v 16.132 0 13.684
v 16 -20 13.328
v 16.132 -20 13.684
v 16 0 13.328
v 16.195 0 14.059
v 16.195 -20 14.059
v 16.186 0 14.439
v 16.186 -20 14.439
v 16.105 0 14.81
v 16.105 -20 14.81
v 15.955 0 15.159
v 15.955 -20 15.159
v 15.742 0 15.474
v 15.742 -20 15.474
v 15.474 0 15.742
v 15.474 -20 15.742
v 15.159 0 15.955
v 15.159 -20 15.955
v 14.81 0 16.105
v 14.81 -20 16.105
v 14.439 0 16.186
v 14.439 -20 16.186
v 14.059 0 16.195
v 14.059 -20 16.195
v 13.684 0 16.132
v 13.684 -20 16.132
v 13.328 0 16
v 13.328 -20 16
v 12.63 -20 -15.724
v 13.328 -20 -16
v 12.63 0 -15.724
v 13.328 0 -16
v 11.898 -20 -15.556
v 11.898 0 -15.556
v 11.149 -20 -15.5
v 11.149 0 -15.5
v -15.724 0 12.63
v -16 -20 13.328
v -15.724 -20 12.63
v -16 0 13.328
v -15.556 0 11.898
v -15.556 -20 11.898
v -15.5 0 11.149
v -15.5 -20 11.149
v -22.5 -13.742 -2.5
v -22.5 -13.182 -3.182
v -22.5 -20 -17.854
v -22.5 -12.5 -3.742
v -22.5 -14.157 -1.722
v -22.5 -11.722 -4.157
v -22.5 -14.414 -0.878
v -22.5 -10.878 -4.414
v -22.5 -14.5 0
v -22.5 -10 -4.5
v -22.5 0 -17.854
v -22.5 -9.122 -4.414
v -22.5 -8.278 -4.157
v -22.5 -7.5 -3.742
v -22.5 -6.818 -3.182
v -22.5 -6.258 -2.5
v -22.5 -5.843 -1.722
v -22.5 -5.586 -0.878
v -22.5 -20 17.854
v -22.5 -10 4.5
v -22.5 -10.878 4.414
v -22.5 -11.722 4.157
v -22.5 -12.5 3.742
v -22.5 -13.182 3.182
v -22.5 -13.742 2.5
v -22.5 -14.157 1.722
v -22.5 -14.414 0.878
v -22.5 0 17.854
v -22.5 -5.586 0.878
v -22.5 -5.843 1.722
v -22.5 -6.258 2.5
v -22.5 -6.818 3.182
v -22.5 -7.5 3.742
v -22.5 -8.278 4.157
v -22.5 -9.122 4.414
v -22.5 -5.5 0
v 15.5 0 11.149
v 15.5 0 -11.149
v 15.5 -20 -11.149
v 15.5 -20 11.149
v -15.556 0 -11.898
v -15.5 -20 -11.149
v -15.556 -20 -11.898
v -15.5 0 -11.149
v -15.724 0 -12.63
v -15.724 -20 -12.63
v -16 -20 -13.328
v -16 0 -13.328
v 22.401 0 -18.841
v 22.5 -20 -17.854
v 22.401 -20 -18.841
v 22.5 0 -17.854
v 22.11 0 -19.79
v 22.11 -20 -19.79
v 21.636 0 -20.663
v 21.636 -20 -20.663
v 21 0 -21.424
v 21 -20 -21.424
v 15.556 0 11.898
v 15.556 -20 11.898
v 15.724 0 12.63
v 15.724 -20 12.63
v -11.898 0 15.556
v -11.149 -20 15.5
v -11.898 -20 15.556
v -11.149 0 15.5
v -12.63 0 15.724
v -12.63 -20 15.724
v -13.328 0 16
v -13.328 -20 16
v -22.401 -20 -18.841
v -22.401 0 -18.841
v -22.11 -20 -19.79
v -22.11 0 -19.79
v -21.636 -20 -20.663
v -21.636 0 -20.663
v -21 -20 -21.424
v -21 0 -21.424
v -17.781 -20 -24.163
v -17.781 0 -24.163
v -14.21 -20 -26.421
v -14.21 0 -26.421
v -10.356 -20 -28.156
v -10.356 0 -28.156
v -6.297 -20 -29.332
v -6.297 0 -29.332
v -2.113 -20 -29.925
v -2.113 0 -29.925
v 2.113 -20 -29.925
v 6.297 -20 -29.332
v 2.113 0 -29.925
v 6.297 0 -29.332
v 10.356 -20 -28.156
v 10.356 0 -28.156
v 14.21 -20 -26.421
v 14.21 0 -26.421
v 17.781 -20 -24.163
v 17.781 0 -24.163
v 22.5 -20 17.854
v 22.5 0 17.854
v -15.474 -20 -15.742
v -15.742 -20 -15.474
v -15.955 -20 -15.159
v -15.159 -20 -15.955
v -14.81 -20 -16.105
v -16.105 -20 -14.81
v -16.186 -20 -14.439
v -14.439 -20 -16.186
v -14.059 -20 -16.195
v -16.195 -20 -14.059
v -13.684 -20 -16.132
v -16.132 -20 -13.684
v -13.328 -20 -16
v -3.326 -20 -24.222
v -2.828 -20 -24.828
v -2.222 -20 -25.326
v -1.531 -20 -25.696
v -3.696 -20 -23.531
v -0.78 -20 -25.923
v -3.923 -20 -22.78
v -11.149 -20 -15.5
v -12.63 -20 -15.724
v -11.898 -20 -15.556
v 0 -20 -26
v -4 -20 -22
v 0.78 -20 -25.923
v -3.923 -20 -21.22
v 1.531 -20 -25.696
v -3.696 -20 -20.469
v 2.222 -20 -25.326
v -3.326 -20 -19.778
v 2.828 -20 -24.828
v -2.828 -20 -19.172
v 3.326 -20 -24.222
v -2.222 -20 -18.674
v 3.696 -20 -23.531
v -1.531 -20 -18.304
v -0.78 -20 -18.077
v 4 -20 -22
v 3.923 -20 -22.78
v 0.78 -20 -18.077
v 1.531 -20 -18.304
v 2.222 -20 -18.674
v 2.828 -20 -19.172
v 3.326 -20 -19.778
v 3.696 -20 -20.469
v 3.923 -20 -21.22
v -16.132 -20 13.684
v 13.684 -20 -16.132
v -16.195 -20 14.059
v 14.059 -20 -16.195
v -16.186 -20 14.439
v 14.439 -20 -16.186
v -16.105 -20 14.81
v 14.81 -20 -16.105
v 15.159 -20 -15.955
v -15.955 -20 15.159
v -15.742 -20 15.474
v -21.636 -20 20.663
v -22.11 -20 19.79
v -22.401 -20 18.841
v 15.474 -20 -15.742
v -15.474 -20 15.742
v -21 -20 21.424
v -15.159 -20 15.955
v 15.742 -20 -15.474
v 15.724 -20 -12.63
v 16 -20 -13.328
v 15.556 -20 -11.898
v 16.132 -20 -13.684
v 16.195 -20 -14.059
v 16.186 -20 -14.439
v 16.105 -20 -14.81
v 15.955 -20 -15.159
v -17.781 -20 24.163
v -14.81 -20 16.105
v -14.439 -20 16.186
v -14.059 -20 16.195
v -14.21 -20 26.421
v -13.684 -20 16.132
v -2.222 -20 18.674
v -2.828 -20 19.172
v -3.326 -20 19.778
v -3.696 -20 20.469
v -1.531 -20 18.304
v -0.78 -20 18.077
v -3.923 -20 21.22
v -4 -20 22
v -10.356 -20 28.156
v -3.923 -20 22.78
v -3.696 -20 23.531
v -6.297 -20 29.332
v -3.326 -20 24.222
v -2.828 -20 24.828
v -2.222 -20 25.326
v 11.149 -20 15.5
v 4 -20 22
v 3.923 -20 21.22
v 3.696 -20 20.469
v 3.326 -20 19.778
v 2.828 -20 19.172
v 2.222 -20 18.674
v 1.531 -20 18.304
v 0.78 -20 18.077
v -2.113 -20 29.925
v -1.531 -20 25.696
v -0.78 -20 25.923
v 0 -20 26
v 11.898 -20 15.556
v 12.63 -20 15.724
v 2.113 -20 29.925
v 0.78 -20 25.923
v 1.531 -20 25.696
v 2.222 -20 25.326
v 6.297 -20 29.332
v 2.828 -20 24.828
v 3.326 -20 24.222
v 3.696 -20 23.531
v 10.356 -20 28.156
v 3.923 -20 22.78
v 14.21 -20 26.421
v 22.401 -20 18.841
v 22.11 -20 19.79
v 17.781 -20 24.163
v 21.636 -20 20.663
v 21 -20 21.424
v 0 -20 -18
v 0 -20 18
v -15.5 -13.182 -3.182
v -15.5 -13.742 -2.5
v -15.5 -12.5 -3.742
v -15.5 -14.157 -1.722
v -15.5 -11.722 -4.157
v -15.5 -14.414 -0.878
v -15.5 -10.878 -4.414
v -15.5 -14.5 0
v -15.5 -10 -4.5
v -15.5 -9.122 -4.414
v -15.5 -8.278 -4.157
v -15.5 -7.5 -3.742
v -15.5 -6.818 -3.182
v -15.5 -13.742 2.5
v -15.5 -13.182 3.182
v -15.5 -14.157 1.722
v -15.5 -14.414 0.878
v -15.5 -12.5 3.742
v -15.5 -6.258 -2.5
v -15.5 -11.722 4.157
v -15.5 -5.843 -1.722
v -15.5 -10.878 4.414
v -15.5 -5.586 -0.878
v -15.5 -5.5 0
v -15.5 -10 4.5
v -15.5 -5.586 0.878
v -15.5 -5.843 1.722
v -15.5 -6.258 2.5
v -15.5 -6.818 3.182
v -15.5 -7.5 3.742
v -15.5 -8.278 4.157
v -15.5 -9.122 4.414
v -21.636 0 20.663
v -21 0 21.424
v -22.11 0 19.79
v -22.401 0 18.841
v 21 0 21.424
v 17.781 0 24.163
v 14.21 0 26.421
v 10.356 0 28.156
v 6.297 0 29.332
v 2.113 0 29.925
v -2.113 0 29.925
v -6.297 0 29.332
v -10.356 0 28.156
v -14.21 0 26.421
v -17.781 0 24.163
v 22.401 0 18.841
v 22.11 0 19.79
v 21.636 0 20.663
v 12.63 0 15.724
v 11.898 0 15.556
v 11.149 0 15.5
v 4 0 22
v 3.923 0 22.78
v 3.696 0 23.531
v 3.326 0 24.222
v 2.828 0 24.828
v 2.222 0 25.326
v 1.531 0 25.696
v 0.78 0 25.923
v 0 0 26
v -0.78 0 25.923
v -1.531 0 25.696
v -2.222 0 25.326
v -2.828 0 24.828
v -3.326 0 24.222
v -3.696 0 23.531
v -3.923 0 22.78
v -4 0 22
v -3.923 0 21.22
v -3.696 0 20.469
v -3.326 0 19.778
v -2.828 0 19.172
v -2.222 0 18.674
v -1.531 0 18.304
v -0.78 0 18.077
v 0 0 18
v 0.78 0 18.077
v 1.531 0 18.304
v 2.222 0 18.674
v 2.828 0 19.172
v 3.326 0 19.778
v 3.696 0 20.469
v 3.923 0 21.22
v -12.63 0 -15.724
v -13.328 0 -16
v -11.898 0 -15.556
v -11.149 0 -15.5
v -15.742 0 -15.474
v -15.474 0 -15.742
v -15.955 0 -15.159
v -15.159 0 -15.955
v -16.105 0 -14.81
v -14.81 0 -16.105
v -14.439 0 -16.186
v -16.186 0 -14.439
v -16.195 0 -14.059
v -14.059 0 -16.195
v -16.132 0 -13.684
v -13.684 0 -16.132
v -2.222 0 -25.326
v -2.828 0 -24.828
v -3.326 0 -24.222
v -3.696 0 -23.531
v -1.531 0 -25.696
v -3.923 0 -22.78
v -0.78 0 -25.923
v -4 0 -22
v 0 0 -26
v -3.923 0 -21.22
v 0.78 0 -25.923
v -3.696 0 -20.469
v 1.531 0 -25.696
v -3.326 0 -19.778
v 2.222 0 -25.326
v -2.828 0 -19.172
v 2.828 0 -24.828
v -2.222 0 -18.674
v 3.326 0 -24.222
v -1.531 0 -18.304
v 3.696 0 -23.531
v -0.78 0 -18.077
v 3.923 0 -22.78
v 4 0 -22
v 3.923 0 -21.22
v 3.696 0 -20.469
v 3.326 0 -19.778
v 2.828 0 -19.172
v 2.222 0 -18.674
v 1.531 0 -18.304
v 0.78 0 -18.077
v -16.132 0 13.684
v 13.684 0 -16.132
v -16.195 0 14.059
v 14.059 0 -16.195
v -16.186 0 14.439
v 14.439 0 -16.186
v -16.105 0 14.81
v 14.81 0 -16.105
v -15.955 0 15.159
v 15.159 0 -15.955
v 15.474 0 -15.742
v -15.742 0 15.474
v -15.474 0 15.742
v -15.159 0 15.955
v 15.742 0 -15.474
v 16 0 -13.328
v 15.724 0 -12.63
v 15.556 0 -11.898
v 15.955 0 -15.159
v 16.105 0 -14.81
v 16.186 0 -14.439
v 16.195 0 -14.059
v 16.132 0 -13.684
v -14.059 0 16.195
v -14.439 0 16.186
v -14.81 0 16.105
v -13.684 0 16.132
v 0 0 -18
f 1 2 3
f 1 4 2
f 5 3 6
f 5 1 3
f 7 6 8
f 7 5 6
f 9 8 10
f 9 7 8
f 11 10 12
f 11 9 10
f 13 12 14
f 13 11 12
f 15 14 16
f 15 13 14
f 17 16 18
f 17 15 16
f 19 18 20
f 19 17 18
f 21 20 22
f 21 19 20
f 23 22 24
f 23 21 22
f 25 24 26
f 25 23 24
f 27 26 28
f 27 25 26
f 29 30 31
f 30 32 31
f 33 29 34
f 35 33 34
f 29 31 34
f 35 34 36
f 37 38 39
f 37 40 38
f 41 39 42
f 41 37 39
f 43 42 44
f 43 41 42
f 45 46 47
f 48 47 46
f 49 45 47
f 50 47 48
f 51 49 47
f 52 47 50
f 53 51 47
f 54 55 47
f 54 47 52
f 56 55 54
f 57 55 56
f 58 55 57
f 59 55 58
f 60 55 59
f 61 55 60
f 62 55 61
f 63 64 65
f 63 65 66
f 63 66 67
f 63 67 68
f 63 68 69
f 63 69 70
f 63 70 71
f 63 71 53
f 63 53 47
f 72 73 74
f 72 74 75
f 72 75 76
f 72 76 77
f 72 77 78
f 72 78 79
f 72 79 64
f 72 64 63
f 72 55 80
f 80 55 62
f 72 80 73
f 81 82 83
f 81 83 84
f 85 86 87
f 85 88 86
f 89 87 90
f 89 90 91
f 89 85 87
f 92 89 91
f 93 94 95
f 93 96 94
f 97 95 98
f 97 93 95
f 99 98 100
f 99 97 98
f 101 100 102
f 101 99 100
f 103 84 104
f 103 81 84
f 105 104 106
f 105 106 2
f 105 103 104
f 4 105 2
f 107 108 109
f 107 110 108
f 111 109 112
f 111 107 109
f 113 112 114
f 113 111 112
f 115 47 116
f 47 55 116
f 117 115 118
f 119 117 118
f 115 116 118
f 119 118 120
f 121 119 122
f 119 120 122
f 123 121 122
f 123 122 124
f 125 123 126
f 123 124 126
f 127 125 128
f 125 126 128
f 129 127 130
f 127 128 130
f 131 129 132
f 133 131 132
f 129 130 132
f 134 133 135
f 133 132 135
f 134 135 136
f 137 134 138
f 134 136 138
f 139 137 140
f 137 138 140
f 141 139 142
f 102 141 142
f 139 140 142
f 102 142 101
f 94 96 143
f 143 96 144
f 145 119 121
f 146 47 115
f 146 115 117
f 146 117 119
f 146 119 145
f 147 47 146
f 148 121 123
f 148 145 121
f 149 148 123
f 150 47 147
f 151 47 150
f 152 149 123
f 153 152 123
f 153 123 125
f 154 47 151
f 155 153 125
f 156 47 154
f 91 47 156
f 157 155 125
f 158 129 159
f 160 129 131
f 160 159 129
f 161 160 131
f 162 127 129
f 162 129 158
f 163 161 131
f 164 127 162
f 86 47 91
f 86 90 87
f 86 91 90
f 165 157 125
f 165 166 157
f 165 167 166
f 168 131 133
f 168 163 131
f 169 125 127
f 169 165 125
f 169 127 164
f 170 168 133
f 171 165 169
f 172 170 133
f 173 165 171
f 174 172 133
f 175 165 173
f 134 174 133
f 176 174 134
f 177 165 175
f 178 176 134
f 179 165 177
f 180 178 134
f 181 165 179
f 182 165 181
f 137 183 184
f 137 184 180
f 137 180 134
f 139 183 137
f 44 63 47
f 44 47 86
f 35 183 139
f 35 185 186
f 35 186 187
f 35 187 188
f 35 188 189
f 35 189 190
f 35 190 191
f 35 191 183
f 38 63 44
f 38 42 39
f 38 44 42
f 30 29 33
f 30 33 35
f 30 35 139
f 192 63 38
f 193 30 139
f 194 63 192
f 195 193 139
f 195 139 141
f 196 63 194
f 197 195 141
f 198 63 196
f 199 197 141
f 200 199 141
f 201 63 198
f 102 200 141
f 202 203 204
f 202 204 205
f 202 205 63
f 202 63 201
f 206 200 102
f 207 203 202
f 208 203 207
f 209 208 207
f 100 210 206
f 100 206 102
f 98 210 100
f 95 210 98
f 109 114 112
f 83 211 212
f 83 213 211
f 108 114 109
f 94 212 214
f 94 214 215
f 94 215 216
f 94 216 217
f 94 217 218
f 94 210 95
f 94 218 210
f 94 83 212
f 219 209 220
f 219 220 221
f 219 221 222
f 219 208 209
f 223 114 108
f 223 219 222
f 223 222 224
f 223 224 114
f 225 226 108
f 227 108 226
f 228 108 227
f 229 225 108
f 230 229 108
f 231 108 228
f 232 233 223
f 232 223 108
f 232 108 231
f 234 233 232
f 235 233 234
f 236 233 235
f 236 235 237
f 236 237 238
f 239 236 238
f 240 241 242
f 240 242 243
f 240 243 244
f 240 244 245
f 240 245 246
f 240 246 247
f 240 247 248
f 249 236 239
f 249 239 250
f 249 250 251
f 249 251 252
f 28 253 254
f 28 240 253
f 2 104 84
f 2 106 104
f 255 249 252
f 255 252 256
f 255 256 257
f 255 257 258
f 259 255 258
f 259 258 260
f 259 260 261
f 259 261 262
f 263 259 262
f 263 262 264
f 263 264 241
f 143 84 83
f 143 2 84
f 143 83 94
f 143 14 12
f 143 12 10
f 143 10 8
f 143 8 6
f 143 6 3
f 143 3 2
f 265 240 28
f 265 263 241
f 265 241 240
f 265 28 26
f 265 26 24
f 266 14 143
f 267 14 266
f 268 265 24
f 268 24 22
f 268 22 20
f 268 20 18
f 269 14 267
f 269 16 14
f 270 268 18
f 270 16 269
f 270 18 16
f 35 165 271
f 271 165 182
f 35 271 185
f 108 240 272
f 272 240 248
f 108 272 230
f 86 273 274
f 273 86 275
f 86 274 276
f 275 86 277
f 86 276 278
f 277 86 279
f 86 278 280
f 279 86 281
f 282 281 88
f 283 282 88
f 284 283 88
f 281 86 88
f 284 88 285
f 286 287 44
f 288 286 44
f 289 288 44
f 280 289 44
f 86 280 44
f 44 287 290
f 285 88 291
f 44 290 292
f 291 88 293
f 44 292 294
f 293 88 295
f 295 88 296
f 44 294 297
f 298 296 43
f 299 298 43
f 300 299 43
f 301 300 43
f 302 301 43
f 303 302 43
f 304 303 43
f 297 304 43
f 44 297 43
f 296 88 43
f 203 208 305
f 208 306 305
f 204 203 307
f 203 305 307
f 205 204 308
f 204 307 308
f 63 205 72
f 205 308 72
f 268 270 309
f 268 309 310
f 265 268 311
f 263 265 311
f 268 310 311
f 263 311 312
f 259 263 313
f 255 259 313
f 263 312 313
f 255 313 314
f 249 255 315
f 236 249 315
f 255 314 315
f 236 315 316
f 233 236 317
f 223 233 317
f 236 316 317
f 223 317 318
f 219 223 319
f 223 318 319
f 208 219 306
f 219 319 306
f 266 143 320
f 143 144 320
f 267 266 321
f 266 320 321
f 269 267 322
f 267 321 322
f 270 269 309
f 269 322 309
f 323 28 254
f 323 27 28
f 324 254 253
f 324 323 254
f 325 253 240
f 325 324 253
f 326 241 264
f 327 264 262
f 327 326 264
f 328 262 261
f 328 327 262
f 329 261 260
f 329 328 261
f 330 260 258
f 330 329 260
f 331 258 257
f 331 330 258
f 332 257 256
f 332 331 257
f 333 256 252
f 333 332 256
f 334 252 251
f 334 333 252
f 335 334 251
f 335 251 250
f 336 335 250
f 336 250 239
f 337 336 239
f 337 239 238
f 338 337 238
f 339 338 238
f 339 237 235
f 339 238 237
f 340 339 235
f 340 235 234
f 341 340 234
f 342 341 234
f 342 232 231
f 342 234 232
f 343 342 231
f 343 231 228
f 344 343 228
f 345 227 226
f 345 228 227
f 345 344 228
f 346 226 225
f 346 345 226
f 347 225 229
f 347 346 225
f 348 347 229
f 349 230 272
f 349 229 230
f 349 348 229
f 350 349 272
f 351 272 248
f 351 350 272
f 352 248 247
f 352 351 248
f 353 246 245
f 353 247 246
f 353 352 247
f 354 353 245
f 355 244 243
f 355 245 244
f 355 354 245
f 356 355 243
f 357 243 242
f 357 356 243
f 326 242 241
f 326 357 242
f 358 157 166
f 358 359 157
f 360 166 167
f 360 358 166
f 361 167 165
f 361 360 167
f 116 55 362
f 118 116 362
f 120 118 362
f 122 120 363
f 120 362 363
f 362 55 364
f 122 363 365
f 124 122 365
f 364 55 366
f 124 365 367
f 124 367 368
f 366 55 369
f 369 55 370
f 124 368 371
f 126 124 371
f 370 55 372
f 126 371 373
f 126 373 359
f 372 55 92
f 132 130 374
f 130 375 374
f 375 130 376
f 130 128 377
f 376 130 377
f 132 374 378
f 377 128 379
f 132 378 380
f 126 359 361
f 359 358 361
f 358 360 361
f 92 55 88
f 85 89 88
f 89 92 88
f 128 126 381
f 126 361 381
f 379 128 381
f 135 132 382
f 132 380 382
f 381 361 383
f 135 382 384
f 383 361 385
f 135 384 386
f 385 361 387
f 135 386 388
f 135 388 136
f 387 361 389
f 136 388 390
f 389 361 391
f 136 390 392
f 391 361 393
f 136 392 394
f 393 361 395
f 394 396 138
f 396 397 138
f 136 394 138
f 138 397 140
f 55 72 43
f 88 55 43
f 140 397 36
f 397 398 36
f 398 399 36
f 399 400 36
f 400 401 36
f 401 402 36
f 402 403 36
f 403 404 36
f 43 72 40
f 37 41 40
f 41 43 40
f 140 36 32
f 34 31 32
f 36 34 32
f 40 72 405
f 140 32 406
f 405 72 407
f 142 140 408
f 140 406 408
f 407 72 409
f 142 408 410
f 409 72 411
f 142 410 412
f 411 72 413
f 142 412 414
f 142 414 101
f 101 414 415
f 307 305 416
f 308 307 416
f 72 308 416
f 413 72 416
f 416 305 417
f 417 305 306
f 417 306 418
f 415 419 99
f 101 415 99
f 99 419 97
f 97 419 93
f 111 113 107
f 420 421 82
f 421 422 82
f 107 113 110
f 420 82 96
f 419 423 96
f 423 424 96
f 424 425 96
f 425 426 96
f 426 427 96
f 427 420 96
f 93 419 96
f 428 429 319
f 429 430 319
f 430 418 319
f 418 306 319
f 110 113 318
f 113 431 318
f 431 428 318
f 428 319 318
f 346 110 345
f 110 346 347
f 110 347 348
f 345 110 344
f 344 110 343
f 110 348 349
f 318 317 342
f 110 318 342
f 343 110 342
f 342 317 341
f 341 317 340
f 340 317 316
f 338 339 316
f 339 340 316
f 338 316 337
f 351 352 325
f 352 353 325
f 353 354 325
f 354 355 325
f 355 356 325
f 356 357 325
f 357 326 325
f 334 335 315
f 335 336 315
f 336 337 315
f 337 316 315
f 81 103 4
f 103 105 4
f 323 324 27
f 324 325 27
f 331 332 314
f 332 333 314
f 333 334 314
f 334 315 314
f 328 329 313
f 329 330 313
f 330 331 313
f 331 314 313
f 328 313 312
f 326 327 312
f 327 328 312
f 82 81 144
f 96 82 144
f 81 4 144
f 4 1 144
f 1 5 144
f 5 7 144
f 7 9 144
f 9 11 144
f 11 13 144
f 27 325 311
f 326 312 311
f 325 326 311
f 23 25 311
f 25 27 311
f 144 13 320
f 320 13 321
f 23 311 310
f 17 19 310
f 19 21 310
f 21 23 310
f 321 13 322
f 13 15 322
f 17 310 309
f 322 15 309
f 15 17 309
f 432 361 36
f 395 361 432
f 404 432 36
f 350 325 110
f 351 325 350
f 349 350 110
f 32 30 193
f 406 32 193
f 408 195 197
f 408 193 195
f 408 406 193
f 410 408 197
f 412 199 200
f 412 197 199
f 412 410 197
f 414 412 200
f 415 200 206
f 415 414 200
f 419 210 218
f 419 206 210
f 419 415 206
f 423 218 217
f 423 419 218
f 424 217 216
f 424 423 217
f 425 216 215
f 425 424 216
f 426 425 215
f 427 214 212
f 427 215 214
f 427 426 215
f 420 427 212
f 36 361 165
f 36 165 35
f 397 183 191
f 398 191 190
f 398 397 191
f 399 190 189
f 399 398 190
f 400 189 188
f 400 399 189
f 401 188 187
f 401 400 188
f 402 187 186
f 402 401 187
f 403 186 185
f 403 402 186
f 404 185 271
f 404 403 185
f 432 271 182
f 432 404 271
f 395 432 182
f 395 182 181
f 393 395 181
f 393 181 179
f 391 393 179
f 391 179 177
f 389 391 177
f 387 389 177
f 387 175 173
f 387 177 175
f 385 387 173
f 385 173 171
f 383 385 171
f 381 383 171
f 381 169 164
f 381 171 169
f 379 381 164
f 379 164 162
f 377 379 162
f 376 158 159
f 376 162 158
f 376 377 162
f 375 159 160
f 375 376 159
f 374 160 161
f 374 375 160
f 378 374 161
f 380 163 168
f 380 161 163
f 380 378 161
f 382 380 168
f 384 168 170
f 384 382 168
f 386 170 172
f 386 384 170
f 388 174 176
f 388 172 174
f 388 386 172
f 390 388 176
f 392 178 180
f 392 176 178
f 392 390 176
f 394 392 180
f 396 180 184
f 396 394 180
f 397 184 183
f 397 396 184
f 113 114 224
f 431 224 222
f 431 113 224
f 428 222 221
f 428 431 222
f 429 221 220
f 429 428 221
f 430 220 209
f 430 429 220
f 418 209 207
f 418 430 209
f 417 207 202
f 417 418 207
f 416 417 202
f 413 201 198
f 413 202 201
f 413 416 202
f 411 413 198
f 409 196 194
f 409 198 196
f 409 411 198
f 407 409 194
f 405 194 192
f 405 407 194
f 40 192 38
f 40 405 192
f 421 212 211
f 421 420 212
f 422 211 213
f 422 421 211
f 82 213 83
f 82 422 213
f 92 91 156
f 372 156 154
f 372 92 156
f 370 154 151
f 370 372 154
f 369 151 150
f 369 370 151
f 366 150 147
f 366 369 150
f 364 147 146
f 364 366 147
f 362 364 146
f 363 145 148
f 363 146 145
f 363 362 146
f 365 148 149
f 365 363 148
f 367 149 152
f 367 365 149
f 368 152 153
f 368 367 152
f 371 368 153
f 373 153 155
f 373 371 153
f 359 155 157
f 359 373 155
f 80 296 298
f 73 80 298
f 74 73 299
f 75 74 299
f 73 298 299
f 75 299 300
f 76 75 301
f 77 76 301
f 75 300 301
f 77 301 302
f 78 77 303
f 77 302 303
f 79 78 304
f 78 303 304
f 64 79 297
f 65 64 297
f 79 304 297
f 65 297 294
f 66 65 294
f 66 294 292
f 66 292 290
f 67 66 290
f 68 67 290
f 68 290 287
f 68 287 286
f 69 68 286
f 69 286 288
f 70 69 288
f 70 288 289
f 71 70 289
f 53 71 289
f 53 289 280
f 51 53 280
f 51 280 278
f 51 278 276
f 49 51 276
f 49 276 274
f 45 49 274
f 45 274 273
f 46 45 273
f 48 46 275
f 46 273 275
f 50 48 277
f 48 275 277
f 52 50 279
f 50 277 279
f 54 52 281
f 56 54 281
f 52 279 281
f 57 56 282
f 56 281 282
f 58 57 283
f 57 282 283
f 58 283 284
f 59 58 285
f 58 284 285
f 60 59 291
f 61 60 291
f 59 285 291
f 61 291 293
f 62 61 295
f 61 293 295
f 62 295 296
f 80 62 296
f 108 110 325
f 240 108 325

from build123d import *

# Parameters (mm, degrees)
F0_R     = 30
F0_W     = 31
F0_H     = 31
F1_DEPTH = 20
F2_R     = 4
F3_DEPTH = 48.3
F4_W     = 47.4329847097
F4_H     = 80
F4_W_2   = 35.6862902641
F5_DEPTH = 29.8
F6_R     = 4.5
F7_DEPTH = 22.501
F8_R     = 2
F9_DEPTH = 20.001
F10_R    = 5
F11_R    = 5


with BuildPart() as f1:
    # F0 (on Front) → F1 (new body)
    with BuildSketch(Plane.XZ):
        Circle(F0_R)
        Rectangle(F0_W, F0_H, mode=Mode.SUBTRACT)
    extrude(amount=F1_DEPTH)

    # F2 (on Front) → F3 (cut)
    with BuildSketch(Plane.XZ):
        with Locations((0, 22)):
            Circle(F2_R)
        with Locations((0, -22)):
            Circle(F2_R)
    extrude(amount=F3_DEPTH, mode=Mode.SUBTRACT)

    # F4 (on Front) → F5 (cut)
    with BuildSketch(Plane.XZ):
        with Locations((-46.2164923549, 0)):
            Rectangle(F4_W, F4_H)
        with Locations((40.3431451321, 0)):
            Rectangle(F4_W_2, F4_H)
    extrude(amount=F5_DEPTH, mode=Mode.SUBTRACT)

    # F6 (on Right) → F7 (cut, through all)
    with BuildSketch(Plane.YZ):
        with Locations((-10, 0)):
            Circle(F6_R)
    extrude(amount=-F7_DEPTH, mode=Mode.SUBTRACT)

    # F8 (on Front) → F9 (cut, through all)
    with BuildSketch(Plane.XZ):
        with Locations((-14.2, 14.2)):
            Circle(F8_R)
        with Locations((14.2, 14.2)):
            Circle(F8_R)
        with Locations((-14.2, -14.2)):
            Circle(F8_R)
        with Locations((14.2, -14.2)):
            Circle(F8_R)
    extrude(amount=F9_DEPTH, mode=Mode.SUBTRACT)

    # F10
    f10_edges = [f1.edges().sort_by_distance(p)[0] for p in [
        (-12.680132, -10, 15.5),
        (-15.5, -10, 12.680132),
        (12.680132, -10, 15.5),
        (15.5, -10, 12.680132),
        (15.5, -10, -12.680132),
        (12.680132, -10, -15.5),
        (-12.680132, -10, -15.5),
        (-15.5, -10, -12.680132),
    ]]
    fillet(f10_edges, radius=F10_R)

    # F11
    f11_edges = [f1.edges().sort_by_distance(p)[0] for p in [
        (-22.5, -10, 19.843135),
        (-22.5, -10, -19.843135),
        (22.5, -10, 19.843135),
        (22.5, -10, -19.843135),
    ]]
    fillet(f11_edges, radius=F11_R)


solid = f1.part
